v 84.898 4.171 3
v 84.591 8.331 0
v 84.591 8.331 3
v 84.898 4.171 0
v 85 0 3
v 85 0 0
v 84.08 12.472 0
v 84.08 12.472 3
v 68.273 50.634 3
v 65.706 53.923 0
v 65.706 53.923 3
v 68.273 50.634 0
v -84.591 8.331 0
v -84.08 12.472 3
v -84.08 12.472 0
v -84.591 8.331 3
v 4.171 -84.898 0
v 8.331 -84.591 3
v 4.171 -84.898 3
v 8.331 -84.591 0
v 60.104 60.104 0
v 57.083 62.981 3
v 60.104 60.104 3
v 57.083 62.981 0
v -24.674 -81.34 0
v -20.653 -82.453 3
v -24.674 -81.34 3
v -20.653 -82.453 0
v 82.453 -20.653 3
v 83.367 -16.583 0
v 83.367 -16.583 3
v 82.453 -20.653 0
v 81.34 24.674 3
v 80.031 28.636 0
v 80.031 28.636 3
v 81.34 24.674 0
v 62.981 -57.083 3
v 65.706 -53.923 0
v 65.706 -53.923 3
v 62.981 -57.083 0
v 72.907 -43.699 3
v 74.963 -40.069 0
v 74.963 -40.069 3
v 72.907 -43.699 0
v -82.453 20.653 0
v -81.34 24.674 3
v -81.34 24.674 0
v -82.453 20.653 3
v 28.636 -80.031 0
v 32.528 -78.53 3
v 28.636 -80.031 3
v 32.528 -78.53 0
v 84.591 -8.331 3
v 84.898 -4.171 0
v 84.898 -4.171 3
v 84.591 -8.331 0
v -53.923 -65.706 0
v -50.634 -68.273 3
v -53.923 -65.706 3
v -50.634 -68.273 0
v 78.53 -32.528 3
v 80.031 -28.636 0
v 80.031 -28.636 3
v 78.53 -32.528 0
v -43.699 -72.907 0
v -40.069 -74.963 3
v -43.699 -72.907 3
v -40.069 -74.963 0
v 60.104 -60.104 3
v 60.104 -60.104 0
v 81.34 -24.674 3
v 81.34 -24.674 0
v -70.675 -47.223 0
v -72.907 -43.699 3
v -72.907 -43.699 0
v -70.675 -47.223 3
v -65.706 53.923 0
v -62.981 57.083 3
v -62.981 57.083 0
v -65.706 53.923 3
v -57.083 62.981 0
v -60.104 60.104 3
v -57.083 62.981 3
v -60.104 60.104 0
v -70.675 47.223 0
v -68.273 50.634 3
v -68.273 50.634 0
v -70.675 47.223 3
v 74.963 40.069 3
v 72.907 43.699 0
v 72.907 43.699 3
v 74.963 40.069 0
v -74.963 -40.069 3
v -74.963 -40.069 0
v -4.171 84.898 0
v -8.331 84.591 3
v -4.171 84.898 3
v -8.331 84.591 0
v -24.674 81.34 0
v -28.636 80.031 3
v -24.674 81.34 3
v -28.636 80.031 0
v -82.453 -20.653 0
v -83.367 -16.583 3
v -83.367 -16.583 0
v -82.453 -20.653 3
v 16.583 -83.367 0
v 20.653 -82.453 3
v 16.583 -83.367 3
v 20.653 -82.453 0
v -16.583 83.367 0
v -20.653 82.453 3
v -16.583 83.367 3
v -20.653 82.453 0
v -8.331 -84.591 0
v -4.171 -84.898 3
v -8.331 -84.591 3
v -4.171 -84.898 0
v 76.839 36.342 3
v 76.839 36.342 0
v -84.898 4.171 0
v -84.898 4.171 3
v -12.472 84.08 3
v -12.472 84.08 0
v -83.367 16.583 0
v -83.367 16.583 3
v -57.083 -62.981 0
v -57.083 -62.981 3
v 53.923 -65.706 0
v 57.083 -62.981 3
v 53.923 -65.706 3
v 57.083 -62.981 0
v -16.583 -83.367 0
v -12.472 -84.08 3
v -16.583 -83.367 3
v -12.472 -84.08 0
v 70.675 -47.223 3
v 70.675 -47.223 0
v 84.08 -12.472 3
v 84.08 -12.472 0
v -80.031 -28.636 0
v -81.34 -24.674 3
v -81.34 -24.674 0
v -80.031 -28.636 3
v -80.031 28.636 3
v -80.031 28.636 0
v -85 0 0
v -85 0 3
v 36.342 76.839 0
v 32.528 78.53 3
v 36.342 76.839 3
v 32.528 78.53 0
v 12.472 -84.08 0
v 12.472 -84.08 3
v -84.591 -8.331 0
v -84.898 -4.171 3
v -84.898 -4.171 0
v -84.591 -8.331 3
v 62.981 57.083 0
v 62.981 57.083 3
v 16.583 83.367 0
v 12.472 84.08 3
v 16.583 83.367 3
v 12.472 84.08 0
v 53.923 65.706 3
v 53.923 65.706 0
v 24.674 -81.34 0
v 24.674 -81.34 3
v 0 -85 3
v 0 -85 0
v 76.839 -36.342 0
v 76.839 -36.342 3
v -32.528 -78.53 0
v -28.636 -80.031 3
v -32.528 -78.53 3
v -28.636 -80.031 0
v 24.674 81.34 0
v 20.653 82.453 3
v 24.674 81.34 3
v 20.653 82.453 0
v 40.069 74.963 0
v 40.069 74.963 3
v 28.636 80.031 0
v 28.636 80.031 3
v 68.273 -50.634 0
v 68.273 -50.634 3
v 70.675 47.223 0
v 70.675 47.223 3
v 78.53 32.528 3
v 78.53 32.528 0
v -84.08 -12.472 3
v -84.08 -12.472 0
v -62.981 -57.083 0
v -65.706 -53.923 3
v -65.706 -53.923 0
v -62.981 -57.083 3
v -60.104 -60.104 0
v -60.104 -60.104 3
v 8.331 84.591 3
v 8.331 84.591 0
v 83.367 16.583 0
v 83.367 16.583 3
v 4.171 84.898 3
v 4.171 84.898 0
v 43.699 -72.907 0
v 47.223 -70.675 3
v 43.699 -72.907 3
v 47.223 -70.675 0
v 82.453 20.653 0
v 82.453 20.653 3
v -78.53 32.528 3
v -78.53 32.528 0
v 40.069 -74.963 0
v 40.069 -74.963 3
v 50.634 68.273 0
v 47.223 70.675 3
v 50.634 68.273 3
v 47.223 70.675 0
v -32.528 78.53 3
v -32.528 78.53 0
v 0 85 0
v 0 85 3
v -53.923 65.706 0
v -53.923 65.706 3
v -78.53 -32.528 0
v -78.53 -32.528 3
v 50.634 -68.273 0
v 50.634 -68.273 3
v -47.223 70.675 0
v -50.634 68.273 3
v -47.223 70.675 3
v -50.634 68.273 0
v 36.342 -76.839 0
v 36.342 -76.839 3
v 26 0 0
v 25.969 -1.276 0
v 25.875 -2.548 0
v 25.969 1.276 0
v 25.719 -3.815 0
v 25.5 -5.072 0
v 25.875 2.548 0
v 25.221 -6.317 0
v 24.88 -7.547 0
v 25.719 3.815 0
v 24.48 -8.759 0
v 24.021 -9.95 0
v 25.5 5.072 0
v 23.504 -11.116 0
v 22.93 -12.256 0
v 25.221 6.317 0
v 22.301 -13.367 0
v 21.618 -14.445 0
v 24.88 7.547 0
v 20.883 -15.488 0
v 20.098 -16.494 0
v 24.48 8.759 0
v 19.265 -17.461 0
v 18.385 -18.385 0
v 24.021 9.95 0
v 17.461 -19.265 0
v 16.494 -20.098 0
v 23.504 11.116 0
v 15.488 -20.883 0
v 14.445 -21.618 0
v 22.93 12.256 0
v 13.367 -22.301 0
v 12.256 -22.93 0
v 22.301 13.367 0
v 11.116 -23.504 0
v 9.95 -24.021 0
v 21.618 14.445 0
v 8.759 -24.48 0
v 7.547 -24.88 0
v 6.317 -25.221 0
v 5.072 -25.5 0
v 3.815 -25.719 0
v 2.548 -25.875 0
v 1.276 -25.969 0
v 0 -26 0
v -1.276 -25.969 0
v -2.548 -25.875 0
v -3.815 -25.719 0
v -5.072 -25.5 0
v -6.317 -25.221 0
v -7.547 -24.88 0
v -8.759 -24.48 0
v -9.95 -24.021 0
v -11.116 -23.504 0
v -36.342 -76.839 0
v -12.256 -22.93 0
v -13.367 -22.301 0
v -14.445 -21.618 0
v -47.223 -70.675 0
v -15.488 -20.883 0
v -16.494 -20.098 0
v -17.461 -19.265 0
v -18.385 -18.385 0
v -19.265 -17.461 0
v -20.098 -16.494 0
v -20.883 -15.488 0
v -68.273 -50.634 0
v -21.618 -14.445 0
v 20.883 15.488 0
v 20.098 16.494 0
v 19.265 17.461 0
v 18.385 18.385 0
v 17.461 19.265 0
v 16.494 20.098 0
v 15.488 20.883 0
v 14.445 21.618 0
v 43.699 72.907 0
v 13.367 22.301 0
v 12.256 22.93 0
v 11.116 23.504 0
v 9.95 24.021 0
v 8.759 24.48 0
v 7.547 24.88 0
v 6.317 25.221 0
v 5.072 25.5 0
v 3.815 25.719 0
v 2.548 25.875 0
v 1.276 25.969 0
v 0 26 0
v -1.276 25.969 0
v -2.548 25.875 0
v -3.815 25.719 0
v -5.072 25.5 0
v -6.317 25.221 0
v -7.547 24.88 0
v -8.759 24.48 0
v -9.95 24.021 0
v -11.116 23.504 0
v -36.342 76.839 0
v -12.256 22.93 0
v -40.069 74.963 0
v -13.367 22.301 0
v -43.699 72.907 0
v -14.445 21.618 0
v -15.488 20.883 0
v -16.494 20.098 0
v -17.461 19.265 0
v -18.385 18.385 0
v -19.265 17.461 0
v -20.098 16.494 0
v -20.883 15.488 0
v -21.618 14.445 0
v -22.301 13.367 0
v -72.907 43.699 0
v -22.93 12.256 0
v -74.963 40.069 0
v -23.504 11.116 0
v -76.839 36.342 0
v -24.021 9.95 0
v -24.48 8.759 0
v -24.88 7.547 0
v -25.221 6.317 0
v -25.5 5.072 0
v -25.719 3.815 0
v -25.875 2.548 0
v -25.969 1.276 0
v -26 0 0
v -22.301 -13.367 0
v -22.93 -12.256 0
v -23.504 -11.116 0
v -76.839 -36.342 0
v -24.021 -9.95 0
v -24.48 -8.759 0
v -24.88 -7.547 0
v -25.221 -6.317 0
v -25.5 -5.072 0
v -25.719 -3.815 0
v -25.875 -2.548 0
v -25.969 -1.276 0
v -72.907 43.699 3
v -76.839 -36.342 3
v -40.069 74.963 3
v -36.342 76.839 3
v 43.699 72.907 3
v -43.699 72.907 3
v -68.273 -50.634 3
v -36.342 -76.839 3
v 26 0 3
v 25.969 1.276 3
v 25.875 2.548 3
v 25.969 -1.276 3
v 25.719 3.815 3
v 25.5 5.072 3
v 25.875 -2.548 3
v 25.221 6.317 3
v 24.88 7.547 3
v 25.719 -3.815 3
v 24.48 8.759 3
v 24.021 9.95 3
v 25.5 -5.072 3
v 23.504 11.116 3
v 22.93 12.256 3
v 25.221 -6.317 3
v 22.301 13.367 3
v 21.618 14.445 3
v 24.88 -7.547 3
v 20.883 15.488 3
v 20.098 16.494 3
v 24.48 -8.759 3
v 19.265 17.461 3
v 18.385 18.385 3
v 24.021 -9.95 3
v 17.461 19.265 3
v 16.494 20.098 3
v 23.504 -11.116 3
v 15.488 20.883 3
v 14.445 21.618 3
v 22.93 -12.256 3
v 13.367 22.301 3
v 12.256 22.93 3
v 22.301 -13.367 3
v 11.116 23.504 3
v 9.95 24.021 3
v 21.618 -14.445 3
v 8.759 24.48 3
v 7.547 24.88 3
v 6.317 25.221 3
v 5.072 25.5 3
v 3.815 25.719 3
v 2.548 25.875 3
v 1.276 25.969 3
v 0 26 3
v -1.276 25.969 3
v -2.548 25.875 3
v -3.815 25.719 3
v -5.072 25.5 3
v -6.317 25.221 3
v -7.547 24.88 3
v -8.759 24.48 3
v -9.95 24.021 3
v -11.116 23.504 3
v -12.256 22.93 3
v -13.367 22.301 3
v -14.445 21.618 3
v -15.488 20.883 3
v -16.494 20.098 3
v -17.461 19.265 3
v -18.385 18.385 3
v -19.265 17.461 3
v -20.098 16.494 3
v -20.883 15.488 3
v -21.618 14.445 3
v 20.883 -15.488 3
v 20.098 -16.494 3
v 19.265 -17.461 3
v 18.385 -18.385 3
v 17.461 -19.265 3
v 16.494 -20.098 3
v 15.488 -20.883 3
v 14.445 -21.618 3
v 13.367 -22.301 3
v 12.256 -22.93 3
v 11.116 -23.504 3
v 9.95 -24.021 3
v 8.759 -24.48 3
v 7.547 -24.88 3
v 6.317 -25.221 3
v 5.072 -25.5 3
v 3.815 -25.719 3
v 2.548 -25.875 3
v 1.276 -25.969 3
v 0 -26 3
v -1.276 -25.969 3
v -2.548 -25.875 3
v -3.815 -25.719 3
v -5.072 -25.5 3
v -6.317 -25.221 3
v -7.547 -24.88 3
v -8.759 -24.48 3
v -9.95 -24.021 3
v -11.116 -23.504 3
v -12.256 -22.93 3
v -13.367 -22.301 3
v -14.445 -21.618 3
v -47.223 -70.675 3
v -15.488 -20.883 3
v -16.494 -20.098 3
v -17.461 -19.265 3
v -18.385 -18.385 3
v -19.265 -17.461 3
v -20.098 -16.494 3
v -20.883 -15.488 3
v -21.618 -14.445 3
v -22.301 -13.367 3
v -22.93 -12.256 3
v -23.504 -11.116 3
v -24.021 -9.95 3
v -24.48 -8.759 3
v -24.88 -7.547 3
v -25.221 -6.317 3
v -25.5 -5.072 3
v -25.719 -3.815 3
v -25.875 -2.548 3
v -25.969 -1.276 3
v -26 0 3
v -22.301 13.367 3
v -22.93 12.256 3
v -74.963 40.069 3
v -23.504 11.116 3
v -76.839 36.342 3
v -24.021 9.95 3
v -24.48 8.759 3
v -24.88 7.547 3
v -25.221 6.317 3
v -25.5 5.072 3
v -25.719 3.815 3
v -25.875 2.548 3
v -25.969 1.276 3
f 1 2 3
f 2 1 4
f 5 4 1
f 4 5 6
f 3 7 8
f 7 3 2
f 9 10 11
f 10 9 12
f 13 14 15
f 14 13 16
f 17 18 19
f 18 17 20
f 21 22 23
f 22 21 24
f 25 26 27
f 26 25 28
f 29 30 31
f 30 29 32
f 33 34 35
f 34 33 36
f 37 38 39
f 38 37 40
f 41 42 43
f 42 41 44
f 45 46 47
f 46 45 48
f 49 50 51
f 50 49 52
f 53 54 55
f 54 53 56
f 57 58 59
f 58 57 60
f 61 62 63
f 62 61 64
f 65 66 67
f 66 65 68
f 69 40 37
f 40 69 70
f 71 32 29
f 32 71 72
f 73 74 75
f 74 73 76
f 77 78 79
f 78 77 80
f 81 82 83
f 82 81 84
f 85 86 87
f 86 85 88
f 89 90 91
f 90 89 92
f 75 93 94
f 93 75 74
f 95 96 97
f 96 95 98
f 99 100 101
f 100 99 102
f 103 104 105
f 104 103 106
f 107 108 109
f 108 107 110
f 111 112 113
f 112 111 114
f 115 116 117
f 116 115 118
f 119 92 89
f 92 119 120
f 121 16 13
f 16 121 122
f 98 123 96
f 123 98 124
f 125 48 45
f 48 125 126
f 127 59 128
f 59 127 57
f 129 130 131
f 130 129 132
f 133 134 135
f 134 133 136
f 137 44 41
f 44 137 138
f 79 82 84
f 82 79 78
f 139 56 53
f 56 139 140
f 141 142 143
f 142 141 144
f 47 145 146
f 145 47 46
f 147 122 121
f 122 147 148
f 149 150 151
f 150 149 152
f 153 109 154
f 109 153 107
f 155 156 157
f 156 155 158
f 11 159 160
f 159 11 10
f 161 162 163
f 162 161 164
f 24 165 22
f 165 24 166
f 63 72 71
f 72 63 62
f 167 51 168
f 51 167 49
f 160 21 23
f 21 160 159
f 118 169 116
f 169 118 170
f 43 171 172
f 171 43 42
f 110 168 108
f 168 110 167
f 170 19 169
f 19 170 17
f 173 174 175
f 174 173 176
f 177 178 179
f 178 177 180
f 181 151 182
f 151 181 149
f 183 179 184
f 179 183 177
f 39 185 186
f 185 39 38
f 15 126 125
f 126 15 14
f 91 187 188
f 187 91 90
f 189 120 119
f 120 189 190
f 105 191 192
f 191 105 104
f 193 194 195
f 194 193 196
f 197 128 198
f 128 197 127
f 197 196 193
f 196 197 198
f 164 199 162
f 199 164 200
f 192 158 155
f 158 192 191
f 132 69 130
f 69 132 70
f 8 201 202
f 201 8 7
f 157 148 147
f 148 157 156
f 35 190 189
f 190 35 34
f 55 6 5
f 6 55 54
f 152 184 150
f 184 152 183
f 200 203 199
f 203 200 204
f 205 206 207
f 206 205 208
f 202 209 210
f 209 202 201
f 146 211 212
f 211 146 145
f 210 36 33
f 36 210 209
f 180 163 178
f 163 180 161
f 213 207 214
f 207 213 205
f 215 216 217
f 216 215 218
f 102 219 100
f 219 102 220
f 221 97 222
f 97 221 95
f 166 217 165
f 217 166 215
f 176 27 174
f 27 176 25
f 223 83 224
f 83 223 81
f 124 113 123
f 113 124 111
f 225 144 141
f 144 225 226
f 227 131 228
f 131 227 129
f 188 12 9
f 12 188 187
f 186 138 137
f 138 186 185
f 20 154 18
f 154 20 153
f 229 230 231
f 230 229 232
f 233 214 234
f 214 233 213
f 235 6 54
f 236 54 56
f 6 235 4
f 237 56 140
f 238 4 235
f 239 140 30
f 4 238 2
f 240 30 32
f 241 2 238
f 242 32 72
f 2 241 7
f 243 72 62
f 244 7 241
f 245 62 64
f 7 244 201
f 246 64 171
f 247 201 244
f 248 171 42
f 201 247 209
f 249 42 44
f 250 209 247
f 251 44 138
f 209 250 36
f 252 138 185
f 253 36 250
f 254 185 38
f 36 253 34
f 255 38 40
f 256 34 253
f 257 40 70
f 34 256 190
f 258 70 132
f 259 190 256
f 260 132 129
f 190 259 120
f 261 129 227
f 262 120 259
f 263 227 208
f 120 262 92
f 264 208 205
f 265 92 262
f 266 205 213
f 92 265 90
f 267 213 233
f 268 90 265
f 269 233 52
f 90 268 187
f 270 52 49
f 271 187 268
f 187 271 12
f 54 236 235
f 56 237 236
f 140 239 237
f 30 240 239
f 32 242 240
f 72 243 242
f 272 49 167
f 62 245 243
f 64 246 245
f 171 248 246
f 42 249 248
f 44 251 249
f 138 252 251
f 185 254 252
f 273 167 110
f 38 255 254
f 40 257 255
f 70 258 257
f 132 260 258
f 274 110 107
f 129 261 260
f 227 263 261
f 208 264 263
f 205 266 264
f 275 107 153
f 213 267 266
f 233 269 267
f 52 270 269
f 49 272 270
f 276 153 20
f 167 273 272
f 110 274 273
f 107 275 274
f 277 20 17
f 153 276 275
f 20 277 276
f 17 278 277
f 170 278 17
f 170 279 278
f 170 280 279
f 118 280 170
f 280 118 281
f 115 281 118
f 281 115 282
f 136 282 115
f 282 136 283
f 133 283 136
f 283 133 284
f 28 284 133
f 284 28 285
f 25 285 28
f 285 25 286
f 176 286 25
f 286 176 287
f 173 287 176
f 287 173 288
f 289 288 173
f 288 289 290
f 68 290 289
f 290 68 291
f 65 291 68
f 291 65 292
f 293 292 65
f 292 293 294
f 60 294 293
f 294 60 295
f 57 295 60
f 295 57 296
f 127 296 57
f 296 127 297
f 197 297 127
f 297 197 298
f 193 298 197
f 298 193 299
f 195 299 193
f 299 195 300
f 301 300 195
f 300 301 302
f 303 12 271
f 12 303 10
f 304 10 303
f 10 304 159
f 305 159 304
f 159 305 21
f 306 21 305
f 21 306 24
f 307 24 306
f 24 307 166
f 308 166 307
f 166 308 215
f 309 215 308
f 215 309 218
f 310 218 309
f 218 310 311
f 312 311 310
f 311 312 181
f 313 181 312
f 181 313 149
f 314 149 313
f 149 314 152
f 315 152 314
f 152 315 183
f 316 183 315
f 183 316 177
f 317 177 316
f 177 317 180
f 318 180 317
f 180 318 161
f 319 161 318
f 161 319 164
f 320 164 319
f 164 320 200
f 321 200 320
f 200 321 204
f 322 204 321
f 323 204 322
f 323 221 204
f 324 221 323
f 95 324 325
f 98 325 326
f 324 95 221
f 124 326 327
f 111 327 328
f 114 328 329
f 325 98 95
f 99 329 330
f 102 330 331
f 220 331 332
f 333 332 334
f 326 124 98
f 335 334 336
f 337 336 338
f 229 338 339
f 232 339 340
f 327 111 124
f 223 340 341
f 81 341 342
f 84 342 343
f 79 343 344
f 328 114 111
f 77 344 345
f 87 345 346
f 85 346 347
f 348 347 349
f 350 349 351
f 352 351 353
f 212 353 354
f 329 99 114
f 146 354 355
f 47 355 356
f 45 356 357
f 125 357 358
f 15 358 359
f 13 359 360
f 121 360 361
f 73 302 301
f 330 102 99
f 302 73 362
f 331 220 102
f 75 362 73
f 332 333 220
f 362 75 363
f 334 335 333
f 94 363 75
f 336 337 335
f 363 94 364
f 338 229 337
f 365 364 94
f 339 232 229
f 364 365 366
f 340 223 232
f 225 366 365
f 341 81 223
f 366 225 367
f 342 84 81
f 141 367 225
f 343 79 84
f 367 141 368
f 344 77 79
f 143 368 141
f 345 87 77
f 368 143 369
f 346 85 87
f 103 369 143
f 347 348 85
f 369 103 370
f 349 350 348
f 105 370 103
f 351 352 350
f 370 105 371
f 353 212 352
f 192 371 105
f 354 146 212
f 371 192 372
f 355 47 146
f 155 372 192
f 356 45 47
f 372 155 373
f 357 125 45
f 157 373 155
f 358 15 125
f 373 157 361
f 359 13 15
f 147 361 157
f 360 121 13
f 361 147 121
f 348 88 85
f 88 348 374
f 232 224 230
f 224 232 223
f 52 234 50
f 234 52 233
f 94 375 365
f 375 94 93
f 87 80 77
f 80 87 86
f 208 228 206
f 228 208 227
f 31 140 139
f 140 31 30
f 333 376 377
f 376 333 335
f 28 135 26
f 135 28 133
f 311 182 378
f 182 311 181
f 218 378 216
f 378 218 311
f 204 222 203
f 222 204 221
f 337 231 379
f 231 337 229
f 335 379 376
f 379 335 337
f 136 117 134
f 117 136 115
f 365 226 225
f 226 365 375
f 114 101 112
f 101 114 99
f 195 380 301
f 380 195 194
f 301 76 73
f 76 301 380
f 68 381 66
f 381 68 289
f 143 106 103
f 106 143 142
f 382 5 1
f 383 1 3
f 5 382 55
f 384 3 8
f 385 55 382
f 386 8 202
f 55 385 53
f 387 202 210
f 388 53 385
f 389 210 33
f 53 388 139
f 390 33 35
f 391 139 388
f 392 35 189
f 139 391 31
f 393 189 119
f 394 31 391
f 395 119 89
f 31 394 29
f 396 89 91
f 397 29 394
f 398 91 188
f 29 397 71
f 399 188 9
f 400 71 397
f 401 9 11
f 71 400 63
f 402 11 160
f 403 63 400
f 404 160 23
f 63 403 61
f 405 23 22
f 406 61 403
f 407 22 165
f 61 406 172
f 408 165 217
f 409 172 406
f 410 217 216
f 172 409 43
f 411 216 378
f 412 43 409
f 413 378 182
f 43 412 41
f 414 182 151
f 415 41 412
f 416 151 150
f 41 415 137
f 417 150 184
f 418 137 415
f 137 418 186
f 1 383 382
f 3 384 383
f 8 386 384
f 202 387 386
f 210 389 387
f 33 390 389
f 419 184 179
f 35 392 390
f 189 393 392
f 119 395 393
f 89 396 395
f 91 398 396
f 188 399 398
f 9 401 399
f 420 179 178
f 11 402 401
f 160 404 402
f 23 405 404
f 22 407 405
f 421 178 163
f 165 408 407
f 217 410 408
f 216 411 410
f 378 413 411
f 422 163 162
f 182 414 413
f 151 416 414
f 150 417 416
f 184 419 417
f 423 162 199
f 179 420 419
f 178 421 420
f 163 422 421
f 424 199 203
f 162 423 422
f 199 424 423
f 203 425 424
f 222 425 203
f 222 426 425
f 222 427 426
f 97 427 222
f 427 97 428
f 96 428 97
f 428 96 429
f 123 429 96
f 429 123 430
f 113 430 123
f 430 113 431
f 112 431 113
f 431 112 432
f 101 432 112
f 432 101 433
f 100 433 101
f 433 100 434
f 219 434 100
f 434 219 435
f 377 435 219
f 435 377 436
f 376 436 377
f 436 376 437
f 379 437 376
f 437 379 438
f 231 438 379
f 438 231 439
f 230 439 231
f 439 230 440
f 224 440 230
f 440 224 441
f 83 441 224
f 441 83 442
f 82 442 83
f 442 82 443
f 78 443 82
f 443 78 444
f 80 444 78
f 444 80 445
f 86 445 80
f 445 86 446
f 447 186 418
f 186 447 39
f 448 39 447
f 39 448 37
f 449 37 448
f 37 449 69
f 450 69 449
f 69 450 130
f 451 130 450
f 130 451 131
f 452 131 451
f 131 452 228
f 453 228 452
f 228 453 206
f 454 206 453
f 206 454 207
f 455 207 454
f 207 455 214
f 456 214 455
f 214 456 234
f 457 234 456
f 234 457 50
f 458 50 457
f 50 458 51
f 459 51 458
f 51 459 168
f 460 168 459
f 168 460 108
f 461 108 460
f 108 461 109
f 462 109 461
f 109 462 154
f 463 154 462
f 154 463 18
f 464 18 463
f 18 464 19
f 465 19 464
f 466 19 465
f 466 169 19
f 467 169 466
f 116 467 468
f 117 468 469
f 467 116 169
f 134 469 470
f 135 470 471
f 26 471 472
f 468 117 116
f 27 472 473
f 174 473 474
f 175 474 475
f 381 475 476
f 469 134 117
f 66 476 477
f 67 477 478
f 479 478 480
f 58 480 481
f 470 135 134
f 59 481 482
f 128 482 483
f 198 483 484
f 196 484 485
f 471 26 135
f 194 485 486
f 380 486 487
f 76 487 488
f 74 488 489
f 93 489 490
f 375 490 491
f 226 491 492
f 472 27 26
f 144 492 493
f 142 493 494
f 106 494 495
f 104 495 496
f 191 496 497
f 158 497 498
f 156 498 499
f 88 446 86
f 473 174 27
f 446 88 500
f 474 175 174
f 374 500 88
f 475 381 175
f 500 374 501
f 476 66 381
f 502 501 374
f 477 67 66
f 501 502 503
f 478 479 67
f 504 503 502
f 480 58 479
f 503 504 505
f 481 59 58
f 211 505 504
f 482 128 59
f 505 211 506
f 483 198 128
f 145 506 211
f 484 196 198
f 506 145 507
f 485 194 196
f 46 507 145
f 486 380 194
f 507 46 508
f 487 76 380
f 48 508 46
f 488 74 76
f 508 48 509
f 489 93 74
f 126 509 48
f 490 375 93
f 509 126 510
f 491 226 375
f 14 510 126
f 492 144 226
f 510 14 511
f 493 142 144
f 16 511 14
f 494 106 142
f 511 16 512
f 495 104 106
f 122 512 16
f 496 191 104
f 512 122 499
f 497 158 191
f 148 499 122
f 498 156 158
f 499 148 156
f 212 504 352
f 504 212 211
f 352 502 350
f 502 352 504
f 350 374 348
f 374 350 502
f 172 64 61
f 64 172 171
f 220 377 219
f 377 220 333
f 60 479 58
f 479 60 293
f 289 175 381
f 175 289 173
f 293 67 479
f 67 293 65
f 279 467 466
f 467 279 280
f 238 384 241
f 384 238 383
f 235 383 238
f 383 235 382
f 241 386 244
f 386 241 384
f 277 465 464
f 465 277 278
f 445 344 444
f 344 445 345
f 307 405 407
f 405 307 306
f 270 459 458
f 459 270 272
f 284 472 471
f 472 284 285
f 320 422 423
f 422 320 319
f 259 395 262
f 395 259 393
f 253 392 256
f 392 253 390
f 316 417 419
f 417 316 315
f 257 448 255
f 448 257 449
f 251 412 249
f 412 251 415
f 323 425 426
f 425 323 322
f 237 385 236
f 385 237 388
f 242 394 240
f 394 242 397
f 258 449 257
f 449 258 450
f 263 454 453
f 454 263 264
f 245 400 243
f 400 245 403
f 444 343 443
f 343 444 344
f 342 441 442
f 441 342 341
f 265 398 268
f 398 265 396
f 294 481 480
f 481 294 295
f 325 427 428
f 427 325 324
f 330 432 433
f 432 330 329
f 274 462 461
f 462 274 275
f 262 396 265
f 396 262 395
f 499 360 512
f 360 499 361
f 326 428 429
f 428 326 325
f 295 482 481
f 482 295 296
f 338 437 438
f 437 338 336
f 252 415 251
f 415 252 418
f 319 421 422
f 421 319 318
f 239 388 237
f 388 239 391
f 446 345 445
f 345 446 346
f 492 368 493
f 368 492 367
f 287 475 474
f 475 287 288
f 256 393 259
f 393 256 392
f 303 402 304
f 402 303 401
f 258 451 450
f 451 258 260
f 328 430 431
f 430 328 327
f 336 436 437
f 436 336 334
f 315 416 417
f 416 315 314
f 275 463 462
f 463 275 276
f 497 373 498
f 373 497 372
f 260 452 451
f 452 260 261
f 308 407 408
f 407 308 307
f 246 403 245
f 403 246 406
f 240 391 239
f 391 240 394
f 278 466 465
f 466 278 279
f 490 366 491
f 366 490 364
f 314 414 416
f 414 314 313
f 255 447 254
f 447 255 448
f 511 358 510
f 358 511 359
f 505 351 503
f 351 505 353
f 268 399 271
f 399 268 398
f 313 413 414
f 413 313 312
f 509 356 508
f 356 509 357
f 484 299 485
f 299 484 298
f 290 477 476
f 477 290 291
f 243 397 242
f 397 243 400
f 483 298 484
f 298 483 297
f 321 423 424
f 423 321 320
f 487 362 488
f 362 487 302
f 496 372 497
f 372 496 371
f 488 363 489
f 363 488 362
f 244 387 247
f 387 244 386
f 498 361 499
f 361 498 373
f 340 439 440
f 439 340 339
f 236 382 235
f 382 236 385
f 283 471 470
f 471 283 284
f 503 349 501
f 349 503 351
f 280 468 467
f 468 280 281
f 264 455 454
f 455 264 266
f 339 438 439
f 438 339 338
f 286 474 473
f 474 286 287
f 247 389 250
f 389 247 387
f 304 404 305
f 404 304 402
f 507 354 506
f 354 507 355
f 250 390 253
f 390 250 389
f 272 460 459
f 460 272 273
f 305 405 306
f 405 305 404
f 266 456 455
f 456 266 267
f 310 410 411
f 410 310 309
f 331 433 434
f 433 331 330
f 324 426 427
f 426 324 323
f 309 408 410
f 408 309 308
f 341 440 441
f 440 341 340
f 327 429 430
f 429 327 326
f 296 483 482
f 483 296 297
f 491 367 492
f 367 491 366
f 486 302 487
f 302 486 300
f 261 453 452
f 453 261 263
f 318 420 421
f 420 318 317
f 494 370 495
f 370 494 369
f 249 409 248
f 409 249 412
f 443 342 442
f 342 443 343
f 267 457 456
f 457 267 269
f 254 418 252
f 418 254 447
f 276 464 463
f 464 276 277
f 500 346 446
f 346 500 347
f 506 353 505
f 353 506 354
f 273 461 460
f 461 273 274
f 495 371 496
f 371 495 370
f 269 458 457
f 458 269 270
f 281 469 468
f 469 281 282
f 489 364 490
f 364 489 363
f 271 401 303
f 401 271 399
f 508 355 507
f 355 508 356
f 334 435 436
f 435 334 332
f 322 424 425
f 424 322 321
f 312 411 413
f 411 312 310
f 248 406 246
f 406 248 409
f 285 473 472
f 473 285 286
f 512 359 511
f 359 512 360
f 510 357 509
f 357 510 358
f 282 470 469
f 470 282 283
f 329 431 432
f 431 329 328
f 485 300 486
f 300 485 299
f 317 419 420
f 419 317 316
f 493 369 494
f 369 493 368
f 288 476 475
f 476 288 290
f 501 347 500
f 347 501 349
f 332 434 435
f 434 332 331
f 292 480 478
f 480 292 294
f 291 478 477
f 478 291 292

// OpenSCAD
$fn=128;

difference() {
  cylinder(h=3, d=170);
  cylinder(h=3, d=52);
}
